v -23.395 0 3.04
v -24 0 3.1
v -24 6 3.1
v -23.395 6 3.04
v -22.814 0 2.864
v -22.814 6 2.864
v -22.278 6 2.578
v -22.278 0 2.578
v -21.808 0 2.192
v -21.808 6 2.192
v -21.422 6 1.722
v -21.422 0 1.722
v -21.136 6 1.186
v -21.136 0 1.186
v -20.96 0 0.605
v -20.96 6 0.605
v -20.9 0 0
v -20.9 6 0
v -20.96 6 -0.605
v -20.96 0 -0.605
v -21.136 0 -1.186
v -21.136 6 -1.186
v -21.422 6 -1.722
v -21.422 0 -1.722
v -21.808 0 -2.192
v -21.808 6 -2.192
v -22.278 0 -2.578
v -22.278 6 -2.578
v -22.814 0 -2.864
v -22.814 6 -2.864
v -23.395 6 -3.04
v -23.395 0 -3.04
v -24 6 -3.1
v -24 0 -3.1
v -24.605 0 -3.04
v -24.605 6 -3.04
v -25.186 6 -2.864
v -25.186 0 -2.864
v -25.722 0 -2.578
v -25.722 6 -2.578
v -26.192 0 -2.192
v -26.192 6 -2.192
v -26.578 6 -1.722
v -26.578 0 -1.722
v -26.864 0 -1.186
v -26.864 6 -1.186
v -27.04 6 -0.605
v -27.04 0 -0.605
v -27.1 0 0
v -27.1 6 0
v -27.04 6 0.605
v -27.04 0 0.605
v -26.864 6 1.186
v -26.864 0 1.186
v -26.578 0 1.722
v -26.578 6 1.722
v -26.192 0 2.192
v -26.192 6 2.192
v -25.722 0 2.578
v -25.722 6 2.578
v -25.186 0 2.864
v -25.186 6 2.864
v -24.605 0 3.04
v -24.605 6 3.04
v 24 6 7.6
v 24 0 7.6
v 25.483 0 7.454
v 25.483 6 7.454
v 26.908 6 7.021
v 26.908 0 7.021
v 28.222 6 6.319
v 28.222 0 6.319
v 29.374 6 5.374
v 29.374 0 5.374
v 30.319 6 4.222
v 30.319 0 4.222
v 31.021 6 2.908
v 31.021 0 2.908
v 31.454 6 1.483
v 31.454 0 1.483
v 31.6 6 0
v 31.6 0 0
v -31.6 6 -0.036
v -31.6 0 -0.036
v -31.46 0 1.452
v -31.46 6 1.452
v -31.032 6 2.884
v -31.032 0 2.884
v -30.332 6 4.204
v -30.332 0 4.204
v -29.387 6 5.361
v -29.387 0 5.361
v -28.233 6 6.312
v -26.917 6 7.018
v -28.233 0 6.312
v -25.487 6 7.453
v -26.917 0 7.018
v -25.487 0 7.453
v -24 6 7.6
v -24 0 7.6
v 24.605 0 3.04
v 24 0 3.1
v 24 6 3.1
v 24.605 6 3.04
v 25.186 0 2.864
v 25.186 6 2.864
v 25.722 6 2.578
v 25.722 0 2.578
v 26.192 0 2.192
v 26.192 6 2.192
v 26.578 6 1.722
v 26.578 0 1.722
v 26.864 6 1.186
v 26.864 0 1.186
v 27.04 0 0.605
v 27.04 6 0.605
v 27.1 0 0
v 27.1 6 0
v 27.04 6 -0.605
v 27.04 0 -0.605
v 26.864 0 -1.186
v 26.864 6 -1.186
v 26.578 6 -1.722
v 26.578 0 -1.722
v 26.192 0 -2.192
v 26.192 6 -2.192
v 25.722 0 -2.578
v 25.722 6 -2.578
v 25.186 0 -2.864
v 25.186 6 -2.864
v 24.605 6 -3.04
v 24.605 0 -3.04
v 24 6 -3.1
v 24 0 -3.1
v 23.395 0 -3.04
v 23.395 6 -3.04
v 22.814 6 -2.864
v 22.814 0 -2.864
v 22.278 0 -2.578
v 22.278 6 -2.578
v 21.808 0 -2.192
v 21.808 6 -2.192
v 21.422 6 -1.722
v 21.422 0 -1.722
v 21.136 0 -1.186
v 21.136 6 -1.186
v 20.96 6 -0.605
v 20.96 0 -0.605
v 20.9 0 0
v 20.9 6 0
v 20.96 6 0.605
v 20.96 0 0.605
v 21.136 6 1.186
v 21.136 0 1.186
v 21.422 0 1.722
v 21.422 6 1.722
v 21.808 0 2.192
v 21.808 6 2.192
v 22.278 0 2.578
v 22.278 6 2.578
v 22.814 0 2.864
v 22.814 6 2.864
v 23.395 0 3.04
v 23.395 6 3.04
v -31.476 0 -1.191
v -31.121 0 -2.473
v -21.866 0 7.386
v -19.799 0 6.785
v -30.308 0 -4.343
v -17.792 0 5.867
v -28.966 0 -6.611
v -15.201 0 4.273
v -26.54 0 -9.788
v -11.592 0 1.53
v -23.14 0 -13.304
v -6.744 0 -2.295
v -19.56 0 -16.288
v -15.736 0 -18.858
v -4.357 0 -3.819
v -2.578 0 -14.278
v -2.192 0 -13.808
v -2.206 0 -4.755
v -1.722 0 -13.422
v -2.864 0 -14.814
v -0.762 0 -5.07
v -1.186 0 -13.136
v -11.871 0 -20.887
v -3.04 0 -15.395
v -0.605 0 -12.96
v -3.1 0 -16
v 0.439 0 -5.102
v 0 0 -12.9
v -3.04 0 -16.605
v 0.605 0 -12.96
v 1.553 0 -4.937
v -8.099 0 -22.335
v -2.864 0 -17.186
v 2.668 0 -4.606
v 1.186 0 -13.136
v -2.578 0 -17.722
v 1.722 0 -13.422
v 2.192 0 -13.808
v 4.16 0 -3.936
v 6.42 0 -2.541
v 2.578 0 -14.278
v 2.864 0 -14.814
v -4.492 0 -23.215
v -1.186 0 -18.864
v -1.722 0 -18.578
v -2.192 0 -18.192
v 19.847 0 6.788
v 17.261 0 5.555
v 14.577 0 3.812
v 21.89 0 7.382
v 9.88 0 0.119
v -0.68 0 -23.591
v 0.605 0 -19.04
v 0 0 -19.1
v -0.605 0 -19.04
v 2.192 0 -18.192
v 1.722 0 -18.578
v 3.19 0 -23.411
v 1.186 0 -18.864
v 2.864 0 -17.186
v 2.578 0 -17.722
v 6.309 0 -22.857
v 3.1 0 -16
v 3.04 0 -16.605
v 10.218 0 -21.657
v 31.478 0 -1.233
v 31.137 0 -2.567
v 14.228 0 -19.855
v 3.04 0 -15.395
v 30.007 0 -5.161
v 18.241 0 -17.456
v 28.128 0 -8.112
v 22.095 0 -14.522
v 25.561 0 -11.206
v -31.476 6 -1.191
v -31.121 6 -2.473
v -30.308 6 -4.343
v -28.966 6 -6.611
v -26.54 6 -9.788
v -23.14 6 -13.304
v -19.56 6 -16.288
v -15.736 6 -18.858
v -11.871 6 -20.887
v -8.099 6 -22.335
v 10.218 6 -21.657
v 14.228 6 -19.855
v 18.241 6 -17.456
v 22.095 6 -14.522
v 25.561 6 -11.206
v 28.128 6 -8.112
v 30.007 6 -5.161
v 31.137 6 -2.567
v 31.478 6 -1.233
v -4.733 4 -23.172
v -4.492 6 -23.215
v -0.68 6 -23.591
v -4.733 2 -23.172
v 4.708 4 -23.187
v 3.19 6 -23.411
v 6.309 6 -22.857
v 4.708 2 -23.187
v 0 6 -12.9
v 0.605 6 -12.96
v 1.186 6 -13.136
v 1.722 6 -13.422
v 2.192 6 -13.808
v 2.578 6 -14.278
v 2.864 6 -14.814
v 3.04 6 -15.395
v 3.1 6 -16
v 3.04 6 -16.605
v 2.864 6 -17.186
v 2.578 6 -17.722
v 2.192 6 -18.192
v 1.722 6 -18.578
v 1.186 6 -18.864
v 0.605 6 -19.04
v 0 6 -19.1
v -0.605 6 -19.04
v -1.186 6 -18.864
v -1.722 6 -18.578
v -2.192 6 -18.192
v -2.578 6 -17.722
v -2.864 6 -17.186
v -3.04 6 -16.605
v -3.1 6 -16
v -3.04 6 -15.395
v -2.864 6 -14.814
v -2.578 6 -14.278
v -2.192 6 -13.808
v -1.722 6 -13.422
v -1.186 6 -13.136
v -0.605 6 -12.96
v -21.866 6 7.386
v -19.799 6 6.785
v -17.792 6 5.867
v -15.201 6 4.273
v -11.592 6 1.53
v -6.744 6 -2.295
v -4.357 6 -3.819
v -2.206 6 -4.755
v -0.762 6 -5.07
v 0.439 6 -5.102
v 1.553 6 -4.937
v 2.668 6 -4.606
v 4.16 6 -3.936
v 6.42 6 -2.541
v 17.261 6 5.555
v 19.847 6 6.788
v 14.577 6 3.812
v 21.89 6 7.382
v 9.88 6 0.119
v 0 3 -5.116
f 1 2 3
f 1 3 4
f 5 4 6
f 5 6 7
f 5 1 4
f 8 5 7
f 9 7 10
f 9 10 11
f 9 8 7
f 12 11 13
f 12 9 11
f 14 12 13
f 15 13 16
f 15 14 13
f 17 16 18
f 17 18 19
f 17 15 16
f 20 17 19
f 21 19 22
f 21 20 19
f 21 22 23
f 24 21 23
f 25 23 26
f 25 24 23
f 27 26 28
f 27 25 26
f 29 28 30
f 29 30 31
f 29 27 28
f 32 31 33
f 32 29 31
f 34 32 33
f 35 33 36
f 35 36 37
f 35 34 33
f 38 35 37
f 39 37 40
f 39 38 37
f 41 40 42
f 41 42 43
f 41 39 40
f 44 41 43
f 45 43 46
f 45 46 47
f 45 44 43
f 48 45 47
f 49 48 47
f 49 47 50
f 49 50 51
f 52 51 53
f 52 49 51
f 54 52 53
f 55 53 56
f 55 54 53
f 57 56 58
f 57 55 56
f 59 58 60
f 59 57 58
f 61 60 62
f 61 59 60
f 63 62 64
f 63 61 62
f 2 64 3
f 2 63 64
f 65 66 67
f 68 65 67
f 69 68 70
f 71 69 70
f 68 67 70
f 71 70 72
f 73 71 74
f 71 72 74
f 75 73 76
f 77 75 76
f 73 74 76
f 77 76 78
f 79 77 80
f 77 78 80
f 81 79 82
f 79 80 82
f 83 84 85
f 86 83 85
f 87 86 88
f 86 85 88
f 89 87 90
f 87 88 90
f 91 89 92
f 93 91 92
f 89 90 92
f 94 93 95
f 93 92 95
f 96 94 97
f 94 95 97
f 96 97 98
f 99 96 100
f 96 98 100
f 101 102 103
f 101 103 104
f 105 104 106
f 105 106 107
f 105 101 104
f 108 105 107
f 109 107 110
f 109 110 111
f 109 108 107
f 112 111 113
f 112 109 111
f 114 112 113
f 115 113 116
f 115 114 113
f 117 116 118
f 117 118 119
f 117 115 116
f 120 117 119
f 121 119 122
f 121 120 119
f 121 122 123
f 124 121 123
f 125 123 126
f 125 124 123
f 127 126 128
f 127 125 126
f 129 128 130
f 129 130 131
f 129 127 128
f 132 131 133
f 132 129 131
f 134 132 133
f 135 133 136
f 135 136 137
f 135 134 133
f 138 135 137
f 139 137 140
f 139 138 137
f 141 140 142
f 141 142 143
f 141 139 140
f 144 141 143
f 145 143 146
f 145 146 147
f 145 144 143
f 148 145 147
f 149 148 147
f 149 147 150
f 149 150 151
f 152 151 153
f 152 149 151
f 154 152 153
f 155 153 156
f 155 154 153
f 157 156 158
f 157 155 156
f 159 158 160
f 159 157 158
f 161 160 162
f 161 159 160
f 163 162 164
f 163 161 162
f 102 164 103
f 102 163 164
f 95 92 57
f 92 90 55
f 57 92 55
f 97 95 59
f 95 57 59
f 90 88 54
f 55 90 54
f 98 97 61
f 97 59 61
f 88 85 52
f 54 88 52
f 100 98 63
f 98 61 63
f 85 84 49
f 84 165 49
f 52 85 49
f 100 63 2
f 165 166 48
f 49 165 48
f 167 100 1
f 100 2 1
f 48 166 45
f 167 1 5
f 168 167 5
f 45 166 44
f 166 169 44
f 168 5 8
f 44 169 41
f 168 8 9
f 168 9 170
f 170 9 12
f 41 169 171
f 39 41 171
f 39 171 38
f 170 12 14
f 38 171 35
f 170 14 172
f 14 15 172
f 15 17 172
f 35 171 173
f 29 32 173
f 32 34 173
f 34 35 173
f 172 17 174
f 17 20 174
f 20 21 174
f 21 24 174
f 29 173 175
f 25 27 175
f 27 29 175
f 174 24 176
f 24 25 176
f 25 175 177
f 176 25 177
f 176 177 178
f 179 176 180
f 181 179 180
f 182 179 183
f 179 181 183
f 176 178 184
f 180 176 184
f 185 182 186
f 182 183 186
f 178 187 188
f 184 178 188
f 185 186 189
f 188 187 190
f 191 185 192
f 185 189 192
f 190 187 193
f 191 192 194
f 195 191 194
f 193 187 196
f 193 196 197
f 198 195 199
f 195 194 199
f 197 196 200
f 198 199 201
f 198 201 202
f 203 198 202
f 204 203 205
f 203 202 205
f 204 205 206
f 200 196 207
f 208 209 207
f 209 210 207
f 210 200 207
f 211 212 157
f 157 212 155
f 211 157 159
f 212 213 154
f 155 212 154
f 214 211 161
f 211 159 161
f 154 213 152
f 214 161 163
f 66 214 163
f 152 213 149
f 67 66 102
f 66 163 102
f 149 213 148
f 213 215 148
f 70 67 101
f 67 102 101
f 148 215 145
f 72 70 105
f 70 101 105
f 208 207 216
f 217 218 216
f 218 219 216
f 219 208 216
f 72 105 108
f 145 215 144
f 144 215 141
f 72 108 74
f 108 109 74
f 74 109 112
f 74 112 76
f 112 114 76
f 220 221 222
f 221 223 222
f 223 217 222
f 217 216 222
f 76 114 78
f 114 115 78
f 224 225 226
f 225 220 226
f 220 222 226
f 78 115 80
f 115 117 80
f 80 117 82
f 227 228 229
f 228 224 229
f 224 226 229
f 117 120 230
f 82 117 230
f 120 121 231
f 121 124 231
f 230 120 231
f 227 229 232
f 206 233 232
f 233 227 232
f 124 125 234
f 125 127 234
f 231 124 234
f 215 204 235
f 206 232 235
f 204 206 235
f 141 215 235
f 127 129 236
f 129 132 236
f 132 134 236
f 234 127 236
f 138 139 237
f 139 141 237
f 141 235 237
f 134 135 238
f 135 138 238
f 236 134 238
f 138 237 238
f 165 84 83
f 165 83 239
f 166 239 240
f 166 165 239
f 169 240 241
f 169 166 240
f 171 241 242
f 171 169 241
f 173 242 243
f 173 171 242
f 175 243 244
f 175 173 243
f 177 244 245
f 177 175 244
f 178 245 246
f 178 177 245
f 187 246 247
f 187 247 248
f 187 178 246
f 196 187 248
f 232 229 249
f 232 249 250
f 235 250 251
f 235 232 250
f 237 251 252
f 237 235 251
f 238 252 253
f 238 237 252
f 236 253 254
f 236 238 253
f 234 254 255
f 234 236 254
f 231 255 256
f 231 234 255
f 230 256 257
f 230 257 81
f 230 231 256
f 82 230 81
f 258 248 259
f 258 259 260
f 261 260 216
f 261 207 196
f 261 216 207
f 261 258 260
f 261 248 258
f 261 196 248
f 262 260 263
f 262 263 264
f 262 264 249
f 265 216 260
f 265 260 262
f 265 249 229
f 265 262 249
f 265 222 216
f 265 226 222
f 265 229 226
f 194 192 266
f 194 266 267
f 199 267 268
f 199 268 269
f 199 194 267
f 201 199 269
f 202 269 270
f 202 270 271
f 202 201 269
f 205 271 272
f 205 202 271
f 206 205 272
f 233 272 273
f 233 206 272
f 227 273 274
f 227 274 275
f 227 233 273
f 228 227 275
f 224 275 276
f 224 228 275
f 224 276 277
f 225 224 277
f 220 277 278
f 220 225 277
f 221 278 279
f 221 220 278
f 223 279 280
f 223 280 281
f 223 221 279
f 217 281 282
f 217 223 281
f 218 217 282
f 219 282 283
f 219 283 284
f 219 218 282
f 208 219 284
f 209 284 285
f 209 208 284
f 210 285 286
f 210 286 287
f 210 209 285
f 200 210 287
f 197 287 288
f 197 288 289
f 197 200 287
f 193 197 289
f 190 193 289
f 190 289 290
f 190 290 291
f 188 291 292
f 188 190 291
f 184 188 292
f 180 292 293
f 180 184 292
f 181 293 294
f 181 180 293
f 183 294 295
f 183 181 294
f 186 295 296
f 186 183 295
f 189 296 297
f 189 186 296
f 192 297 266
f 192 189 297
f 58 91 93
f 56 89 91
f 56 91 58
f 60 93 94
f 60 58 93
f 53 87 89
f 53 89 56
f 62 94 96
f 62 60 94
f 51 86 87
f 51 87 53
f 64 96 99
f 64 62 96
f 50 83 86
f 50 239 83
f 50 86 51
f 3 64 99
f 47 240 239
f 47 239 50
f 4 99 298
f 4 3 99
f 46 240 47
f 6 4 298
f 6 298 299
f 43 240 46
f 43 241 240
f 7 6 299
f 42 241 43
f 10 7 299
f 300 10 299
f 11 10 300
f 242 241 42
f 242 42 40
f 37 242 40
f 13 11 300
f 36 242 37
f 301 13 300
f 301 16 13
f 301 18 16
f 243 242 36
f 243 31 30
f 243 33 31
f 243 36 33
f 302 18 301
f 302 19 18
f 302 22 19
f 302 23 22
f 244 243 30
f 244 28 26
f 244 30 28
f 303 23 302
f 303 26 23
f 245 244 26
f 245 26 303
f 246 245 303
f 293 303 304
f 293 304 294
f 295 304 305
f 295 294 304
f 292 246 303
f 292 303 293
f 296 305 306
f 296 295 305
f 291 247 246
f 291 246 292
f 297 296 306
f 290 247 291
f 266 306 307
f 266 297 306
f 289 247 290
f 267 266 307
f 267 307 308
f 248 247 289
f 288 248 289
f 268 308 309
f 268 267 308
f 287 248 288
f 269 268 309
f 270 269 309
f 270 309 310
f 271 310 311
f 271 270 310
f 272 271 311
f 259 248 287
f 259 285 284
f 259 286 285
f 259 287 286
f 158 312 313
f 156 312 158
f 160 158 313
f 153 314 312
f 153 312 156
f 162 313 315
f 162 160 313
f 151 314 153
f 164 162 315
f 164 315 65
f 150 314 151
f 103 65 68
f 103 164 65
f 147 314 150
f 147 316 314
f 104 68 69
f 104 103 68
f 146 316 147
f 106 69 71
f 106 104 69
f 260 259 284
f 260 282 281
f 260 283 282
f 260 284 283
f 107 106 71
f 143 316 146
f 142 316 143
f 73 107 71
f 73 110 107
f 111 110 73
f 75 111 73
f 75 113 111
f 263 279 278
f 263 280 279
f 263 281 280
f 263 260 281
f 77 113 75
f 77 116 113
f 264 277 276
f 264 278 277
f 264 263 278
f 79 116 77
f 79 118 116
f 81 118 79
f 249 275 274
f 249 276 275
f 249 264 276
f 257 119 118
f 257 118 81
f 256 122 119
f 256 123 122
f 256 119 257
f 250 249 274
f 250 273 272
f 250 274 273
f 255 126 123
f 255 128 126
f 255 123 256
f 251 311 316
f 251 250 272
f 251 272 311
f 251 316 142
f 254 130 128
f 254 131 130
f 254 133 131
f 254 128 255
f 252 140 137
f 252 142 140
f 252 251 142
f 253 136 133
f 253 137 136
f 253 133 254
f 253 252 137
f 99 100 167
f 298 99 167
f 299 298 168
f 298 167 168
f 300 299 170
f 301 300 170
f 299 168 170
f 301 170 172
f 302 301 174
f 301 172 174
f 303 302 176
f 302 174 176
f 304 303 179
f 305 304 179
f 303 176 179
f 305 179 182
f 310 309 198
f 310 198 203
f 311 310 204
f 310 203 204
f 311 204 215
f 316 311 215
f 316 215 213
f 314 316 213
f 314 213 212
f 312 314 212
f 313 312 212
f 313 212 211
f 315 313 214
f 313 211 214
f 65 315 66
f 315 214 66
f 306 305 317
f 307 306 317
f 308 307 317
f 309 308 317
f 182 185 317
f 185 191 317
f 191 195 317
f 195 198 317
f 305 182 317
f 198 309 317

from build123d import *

# Parameters (mm, degrees)
SKETCH1_R           = 3.1
BOSS_EXTRUDE1_DEPTH = 6


with BuildPart() as part:
    # Sketch1 → Boss-Extrude1 (new body)
    with BuildSketch(Plane(origin=(0, 0, 0), x_dir=(1, 0, 0), z_dir=(0, 1, 0))):
        with BuildLine():
            ThreePointArc((-31.599916308, 0.035666759), (-29.38660688, -5.361386604), (-24, -7.6))
            add(Edge.make_bspline(
                [(-24, -7.6), (-14.668264125, -7.61499575), (0.011178466, 17.82220608), (14.645907193, -7.566074292), (24, -7.6)],
                knots=[0, 0, 0, 0, 0.5, 1, 1, 1, 1], degree=3))
            ThreePointArc((24, -7.6), (29.374011537, -5.374011537), (31.6, 0))
            add(Edge.make_bspline(
                [(-31.599916308, 0.035666759), (-31.577855131, 6.453958953), (-15.873953038, 23.775800665), (16.019610489, 23.704017602), (31.552058953, 7.12035463), (31.6, 0)],
                knots=[0, 0, 0, 0, 0.447467305, 0.547467305, 1, 1, 1, 1], degree=3))
        make_face()
        with Locations((-24, 0)):
            Circle(SKETCH1_R, mode=Mode.SUBTRACT)
        with Locations((24, 0)):
            Circle(SKETCH1_R, mode=Mode.SUBTRACT)
        with Locations((0, 16)):
            Circle(SKETCH1_R, mode=Mode.SUBTRACT)
    extrude(amount=BOSS_EXTRUDE1_DEPTH)


solid = part.part
